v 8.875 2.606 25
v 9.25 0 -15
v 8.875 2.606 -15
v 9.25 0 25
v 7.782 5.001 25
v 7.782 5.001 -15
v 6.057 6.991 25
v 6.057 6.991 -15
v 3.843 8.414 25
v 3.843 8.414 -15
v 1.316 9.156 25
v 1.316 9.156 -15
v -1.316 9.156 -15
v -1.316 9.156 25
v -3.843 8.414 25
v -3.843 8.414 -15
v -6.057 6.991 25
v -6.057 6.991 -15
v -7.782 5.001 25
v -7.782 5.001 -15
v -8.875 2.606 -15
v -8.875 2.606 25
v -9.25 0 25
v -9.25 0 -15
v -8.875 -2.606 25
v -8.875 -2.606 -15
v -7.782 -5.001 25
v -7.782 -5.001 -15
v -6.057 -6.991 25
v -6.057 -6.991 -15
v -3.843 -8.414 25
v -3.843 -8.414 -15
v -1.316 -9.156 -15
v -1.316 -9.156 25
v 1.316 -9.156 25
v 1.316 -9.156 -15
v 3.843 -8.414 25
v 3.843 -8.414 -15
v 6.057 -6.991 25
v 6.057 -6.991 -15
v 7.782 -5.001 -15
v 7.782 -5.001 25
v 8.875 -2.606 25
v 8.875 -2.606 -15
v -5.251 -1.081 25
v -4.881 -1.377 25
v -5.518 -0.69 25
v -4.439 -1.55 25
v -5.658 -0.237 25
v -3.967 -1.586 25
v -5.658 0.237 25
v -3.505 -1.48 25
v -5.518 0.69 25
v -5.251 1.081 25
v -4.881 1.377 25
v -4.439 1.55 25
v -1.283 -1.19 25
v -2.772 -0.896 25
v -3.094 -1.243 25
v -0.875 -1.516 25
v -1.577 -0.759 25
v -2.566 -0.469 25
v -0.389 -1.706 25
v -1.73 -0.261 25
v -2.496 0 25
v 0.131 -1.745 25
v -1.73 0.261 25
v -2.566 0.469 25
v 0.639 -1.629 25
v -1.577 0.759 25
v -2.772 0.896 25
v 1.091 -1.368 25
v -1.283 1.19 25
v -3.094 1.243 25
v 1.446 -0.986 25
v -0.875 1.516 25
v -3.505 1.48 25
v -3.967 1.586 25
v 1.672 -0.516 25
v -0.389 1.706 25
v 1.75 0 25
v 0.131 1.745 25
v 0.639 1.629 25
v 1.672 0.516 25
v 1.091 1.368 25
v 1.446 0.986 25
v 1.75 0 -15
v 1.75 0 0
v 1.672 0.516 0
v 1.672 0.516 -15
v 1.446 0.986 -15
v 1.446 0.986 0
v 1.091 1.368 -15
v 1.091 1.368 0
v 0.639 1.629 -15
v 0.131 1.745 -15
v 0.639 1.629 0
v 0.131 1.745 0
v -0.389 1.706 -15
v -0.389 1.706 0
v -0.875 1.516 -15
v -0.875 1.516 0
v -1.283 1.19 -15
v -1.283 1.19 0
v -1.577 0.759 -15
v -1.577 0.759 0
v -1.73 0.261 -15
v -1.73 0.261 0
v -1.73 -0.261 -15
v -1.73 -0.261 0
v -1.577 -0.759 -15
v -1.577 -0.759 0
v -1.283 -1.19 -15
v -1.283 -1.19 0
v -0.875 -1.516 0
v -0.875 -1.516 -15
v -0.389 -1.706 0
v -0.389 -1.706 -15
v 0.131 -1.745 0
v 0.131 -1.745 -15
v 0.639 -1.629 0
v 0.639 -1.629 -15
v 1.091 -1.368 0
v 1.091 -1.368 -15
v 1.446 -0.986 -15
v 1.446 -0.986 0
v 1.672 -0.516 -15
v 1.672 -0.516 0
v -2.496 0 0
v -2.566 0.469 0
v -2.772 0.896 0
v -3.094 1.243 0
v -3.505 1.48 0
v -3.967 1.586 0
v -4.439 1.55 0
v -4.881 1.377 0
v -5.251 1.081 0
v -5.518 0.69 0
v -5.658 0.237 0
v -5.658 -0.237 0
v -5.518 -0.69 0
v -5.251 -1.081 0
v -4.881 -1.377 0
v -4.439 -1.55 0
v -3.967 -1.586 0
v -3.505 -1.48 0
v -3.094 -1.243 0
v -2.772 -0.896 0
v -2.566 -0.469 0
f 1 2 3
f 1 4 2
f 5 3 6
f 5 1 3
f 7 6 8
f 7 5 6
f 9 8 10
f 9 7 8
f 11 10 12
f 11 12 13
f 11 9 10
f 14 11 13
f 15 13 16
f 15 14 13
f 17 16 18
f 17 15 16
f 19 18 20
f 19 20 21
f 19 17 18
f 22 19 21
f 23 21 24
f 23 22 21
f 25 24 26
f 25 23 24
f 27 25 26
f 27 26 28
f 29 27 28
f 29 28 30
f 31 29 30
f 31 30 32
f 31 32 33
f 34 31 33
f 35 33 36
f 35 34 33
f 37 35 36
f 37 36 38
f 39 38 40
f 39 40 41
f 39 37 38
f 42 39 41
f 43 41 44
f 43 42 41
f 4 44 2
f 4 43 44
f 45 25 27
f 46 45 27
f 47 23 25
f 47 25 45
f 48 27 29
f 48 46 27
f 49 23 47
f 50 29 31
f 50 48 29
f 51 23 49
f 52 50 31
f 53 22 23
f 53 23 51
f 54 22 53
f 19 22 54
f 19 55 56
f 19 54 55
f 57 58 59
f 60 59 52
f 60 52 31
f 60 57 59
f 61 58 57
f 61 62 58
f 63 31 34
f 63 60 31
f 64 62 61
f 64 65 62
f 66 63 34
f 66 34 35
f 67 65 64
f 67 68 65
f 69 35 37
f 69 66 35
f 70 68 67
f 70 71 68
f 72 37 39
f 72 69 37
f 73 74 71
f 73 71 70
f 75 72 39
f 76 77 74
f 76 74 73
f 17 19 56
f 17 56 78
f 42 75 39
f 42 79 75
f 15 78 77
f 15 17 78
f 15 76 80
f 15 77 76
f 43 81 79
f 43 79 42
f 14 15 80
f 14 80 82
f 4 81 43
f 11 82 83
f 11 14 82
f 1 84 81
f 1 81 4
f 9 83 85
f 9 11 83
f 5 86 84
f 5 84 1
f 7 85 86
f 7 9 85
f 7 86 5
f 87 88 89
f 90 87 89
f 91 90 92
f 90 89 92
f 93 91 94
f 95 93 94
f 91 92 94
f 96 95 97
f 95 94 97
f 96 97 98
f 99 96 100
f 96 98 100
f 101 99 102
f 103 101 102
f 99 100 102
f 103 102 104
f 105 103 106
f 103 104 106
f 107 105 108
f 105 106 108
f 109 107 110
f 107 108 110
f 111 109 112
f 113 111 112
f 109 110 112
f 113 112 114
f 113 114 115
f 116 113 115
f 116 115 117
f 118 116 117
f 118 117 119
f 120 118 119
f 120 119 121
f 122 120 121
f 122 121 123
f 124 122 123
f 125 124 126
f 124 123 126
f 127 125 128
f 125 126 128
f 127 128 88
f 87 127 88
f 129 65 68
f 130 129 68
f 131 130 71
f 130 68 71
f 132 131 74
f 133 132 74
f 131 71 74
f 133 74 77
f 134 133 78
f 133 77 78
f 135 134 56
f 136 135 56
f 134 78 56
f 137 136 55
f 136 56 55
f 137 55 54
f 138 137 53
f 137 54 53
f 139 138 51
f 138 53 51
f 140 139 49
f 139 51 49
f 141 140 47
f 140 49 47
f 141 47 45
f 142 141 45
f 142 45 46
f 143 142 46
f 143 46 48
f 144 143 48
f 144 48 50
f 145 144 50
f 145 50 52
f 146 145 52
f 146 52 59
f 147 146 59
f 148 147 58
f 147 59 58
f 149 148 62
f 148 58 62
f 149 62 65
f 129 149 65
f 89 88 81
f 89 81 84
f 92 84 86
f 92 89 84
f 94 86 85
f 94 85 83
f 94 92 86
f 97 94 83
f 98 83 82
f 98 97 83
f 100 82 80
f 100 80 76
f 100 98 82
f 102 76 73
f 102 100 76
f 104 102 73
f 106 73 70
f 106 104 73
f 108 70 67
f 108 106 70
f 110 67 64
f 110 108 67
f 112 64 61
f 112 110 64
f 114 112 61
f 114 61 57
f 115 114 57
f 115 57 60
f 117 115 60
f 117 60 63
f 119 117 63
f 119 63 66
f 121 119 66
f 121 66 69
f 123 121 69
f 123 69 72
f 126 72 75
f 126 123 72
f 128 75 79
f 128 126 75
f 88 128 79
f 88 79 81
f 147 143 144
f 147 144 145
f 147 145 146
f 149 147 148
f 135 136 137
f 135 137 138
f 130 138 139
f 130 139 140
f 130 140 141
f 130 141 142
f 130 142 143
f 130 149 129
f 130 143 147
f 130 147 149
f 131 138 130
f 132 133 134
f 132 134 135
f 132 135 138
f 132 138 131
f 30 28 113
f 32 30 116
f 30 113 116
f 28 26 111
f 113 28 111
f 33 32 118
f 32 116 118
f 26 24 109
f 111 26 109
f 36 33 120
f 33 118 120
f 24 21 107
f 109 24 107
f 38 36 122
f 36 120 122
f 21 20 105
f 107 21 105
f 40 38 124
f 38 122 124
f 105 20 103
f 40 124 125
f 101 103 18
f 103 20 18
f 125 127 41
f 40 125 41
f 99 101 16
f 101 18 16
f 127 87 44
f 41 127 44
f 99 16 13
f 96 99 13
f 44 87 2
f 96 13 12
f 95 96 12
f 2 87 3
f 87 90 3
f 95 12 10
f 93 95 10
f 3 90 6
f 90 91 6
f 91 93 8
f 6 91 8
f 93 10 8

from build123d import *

# Parameters (mm, degrees)
F0_R     = 9.25
F0_R_2   = 1.75
F1_DEPTH = 25
F2_DEPTH = 15
F4_R     = 1.5899779652
F5_DEPTH = 25


with BuildPart() as f1:
    # F0 (on Top) → F1 (new body)
    with BuildSketch(Plane.XY):
        Circle(F0_R)
        Circle(F0_R_2, mode=Mode.SUBTRACT)
    extrude(amount=F1_DEPTH)

    # F2 (add): a face of the model
    f2_faces = [f1.faces().sort_by_distance(p)[0] for p in [
        (-8.988370491, 0, 0),
    ]]
    extrude(f2_faces, amount=F2_DEPTH)

    # F4 (on face) → F5 (cut)
    with BuildSketch(Plane.XY.offset(25)):
        with Locations((-4.0855864063, 0)):
            Circle(F4_R)
    extrude(amount=-F5_DEPTH, mode=Mode.SUBTRACT)


solid = f1.part
